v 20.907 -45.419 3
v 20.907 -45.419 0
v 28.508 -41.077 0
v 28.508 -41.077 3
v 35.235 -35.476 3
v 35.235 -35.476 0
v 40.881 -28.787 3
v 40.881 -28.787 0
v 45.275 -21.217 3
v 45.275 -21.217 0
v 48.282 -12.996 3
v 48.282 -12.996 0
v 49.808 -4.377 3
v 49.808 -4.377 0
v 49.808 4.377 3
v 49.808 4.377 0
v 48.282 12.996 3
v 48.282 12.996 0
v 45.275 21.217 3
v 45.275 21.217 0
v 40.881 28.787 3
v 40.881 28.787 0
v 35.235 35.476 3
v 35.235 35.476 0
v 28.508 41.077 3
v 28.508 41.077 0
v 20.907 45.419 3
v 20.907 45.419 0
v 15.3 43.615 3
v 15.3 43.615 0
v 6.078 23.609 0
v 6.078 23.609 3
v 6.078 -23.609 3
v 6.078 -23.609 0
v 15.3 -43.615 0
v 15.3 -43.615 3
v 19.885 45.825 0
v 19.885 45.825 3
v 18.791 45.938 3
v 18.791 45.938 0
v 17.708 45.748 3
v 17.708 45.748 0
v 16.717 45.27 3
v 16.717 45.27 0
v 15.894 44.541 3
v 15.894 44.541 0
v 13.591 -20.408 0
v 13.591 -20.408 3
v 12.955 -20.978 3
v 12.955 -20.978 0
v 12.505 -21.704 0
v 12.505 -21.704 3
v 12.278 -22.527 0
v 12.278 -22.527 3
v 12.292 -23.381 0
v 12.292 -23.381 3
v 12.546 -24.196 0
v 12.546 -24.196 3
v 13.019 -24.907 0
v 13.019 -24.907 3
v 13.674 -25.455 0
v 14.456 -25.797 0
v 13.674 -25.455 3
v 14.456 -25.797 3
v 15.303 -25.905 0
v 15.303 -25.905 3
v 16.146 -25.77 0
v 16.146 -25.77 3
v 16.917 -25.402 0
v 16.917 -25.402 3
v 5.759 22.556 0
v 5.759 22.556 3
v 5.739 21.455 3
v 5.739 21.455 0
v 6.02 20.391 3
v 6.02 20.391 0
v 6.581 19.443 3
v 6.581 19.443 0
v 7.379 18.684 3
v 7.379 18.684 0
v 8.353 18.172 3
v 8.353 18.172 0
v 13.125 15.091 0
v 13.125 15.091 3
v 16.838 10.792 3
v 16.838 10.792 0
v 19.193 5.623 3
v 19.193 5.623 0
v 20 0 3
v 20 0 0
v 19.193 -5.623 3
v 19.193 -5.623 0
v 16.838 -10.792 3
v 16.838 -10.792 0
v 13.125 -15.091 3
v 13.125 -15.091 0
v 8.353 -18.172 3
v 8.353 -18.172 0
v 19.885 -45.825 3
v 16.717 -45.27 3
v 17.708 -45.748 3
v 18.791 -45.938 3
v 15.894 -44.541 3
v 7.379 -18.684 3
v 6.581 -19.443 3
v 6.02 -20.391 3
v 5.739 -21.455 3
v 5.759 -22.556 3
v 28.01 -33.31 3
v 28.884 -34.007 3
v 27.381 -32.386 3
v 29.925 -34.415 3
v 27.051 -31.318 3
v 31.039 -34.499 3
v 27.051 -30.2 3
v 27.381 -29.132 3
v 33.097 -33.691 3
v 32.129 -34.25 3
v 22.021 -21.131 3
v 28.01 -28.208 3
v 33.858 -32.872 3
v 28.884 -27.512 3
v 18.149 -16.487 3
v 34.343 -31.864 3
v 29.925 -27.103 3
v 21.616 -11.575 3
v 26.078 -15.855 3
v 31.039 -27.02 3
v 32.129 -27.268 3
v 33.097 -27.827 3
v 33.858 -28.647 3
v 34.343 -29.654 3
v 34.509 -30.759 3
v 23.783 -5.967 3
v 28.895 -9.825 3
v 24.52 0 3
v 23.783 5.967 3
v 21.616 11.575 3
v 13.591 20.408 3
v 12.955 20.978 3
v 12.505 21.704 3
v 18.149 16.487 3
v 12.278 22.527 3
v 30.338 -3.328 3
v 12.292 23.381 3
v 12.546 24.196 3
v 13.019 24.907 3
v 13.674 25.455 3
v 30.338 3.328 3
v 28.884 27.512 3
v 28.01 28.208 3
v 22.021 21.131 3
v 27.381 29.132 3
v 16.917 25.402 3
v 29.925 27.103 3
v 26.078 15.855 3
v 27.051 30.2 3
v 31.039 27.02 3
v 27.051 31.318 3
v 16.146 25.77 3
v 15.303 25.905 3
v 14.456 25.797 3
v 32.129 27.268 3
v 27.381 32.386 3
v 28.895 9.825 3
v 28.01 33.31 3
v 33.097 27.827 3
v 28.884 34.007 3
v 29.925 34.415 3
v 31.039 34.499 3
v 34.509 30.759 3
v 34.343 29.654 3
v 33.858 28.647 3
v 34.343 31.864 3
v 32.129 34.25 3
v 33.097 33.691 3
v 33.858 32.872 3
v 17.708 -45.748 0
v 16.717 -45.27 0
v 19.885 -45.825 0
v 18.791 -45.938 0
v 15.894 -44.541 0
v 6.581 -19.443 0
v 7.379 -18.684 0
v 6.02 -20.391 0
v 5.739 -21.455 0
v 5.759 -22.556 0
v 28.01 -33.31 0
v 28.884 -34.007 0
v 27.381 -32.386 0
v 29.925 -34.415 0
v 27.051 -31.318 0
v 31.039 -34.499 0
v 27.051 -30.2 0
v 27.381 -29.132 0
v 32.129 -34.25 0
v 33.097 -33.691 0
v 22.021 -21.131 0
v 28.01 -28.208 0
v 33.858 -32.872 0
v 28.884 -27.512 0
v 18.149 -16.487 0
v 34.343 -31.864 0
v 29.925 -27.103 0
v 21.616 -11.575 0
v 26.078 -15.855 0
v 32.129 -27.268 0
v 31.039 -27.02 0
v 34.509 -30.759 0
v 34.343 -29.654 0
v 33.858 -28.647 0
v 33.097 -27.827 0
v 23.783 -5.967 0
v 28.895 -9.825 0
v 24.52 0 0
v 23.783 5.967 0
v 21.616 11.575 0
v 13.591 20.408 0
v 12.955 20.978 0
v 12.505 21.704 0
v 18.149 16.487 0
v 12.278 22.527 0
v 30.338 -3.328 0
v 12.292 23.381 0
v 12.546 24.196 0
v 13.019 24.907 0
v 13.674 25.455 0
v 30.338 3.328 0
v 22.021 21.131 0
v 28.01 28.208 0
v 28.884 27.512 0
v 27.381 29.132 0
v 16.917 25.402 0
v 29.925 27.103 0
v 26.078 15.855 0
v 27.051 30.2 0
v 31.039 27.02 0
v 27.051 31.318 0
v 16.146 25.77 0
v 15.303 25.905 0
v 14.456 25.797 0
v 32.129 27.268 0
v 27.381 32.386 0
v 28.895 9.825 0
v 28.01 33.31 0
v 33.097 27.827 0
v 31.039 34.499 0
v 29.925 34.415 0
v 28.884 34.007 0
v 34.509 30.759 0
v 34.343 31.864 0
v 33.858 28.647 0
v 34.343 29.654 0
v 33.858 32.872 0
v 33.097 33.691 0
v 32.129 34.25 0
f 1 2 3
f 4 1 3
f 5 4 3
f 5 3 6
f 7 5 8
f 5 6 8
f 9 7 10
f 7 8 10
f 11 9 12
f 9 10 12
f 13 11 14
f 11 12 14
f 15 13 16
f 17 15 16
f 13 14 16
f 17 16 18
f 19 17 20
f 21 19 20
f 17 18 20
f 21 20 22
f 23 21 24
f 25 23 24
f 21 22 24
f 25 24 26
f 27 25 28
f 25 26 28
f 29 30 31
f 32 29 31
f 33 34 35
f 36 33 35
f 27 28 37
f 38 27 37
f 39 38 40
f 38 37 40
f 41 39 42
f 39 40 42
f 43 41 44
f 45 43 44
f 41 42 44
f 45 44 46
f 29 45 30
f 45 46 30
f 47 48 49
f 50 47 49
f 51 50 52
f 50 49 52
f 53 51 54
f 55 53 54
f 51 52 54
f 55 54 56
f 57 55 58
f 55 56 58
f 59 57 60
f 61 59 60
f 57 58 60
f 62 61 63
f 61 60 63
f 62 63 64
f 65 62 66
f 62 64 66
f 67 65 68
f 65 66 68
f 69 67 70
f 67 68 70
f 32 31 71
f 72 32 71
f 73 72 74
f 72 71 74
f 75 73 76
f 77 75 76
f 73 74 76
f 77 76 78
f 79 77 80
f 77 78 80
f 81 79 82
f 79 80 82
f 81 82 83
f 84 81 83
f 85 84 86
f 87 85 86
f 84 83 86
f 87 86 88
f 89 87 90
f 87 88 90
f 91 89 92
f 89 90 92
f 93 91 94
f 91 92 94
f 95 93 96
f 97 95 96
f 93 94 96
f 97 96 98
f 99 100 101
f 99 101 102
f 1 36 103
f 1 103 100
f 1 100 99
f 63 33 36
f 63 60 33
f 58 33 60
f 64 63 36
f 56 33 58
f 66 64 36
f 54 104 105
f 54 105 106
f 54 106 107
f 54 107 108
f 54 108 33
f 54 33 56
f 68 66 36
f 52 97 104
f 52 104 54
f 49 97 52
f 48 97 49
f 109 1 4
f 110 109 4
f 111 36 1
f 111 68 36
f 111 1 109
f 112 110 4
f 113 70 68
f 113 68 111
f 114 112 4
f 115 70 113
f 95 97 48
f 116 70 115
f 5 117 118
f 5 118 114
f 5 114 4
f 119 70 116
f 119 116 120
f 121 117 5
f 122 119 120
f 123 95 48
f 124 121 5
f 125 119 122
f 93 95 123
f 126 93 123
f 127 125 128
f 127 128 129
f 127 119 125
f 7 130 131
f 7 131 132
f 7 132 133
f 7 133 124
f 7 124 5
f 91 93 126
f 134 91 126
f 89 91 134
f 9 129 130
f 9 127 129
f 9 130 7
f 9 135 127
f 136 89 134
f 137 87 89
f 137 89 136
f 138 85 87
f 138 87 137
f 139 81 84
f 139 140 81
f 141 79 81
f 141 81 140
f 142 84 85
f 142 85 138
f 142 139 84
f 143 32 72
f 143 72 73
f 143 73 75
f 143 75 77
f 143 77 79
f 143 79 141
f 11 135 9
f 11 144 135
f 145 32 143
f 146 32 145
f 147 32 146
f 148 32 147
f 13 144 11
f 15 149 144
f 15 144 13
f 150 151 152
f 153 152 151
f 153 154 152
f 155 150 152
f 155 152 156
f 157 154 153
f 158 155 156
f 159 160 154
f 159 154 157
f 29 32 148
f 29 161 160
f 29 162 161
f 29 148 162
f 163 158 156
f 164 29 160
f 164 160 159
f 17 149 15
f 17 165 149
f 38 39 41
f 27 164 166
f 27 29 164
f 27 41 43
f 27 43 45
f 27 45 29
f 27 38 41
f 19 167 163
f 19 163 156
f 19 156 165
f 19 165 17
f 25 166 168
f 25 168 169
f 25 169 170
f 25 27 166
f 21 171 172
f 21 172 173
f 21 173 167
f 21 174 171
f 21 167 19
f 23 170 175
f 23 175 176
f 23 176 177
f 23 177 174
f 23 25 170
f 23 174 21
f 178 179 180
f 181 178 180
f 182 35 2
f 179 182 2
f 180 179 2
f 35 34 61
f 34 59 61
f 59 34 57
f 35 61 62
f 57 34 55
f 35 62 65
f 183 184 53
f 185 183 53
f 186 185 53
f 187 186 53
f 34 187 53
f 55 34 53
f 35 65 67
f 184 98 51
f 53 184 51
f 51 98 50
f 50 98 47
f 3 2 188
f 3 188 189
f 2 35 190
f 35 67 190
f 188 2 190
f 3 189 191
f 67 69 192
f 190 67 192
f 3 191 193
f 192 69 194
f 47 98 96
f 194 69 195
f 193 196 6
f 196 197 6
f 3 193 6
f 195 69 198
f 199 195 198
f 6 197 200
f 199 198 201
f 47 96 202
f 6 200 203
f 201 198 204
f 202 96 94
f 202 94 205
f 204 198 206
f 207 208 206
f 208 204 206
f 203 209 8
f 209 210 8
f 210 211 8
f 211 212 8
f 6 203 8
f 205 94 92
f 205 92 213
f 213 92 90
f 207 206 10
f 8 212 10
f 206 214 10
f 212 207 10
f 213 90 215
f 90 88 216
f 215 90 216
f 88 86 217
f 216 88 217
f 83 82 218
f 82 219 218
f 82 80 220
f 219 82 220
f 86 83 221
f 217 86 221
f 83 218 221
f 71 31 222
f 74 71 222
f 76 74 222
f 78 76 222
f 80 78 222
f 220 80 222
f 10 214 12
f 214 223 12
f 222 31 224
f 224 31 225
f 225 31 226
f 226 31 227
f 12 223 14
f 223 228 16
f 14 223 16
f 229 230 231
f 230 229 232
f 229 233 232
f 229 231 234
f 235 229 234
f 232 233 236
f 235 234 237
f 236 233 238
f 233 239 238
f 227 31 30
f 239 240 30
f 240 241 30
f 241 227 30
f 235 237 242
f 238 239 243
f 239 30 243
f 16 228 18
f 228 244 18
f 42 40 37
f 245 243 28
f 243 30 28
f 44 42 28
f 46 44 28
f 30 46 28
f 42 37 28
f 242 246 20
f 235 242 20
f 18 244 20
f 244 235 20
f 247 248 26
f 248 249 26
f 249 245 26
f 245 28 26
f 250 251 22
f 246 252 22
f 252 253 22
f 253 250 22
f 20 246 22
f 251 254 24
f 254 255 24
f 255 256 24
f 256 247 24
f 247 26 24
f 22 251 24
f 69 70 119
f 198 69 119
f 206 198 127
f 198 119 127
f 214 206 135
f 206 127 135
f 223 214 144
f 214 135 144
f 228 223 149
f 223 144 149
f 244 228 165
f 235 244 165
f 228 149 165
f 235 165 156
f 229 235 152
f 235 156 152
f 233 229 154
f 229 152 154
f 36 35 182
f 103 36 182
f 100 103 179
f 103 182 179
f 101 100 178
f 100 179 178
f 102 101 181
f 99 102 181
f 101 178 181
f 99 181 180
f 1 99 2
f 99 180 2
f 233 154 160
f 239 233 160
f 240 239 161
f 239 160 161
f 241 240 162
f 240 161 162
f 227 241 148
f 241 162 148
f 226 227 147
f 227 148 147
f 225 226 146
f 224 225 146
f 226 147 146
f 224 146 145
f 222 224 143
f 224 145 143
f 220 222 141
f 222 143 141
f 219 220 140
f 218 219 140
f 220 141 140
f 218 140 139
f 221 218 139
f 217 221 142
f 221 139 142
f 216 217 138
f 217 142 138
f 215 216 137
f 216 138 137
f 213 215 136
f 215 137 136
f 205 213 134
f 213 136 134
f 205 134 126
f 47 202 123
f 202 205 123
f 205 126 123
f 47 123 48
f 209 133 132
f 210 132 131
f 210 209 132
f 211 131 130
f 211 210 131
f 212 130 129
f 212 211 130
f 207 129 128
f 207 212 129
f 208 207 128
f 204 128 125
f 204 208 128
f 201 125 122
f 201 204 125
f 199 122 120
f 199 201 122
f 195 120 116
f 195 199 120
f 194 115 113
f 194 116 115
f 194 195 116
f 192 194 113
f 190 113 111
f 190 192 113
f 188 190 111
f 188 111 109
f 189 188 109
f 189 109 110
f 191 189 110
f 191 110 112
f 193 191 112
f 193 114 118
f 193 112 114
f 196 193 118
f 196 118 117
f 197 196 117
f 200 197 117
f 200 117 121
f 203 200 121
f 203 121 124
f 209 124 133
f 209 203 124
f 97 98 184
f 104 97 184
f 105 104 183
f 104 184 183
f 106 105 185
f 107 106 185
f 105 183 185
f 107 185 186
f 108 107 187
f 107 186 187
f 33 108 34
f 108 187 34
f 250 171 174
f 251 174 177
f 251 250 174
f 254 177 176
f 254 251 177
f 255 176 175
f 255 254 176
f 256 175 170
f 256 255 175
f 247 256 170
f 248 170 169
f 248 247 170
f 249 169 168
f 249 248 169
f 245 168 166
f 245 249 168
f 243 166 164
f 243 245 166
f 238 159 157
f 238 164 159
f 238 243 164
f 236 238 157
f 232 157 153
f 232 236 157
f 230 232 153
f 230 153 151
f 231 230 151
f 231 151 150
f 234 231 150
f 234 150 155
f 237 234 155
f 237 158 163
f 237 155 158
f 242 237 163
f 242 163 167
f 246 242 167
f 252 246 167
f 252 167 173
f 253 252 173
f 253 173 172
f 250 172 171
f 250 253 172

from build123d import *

# Parameters (mm, degrees)
F2_DEPTH = 3
F0_R     = 3.75
F3_DEPTH = 25
F5_DEPTH = 25


with BuildPart() as f2:
    # F1 (on Top) → F2 (new body)
    with BuildSketch(Plane.XY):
        with BuildLine():
            Line((15.300233, 43.614948), (6.077594, 23.609497))
            ThreePointArc((6.077594, 23.609497), (6.020288, 20.390579), (8.353267, 18.172037))
            ThreePointArc((8.353267, 18.172037), (20, 0), (8.353267, -18.172037))
            ThreePointArc((8.353267, -18.172037), (6.020288, -20.390579), (6.077594, -23.609497))
            Line((6.077594, -23.609497), (15.300233, -43.614948))
            ThreePointArc((15.300233, -43.614948), (17.707769, -45.748102), (20.907488, -45.418905))
            ThreePointArc((20.907488, -45.418905), (50, 0), (20.907488, 45.418905))
            ThreePointArc((20.907488, 45.418905), (17.707769, 45.748102), (15.300233, 43.614948))
        make_face()
    extrude(amount=F2_DEPTH)

    # F0 (on Top) → F3 (cut)
    with BuildSketch(Plane.XY):
        with Locations((30.759145, 30.759145)):
            Circle(F0_R)
        with Locations((30.759145, -30.759145)):
            Circle(F0_R)
    extrude(amount=F3_DEPTH, mode=Mode.SUBTRACT)

    # F4 (on face) → F5 (cut)
    with BuildSketch(Plane.XY.offset(3)):
        with BuildLine():
            ThreePointArc((16.917114, 25.402395), (12.757267, 24.568324), (13.591338, 20.408477))
            ThreePointArc((13.591338, 20.408477), (24.52, 0), (13.591338, -20.408477))
            ThreePointArc((13.591338, -20.408477), (12.757267, -24.568324), (16.917114, -25.402395))
            ThreePointArc((16.917114, -25.402395), (30.52, 0), (16.917114, 25.402395))
        make_face()
    extrude(amount=-F5_DEPTH, mode=Mode.SUBTRACT)


solid = f2.part
